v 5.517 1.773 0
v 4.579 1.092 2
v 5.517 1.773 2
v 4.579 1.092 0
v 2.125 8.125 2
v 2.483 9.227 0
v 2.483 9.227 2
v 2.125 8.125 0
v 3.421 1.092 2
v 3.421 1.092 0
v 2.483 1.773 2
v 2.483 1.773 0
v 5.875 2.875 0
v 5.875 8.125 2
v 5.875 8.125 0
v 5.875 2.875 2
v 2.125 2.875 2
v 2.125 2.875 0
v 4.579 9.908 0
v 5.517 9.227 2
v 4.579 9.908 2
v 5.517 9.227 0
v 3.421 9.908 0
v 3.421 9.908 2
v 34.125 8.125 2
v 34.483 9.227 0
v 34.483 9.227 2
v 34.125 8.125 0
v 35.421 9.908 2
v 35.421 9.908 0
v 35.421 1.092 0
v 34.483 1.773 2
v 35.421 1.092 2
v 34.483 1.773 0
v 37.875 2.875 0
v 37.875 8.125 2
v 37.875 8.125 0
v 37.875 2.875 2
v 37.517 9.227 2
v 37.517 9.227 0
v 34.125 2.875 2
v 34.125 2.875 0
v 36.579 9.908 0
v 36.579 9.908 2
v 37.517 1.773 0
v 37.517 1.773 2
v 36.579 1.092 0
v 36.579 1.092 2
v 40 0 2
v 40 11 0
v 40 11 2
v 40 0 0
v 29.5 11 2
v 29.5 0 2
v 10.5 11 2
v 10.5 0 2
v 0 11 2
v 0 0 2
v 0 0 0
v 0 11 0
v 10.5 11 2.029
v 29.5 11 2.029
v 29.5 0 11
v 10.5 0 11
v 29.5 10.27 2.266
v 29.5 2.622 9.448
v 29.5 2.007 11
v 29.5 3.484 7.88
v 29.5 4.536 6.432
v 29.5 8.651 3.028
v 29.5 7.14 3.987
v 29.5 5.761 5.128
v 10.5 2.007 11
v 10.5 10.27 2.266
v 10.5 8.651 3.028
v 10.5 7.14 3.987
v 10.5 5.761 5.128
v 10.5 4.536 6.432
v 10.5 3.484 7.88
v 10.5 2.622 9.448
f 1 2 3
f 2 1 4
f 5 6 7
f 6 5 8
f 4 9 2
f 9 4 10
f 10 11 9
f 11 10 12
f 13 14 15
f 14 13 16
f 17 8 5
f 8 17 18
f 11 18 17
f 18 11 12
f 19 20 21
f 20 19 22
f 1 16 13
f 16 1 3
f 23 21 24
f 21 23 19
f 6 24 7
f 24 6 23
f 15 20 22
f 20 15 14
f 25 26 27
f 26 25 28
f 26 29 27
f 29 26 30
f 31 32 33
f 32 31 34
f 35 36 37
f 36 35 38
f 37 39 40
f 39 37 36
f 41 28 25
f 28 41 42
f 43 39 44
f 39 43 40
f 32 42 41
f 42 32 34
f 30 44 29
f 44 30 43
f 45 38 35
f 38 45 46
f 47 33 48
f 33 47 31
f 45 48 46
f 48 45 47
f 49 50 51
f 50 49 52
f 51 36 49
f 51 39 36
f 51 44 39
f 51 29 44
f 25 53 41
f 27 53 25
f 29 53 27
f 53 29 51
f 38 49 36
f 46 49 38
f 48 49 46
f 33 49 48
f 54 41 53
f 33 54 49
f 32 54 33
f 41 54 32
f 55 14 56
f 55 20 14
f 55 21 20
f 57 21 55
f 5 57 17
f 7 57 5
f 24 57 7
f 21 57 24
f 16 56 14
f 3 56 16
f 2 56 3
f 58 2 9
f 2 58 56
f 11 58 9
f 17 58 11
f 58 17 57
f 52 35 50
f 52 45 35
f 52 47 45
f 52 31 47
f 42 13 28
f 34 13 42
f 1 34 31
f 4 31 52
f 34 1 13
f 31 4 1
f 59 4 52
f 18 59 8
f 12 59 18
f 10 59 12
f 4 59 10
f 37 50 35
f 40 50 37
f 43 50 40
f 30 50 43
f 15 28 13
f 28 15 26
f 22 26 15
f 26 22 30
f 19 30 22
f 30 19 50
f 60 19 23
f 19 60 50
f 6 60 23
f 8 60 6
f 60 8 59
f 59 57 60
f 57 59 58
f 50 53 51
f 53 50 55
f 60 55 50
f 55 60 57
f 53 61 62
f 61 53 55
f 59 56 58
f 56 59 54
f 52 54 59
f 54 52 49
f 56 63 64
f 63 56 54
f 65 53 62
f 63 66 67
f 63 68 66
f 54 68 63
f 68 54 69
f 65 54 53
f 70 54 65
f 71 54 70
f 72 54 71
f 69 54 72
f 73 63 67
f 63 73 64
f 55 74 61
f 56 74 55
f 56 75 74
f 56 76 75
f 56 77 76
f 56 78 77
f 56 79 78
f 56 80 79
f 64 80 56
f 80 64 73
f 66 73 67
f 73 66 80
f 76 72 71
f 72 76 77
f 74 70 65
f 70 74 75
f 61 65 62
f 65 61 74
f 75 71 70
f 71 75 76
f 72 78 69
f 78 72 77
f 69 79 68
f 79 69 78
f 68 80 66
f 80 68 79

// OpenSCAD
/****************************************************/
/*************User specified parameters**************/

//length of catch base
length = 40; // [5:100]

//width of catch base
width = 11; // [5:100]

//maximum height of catch
height = 11; // [5:100]

//thickness of catch base
base_thick = 2; // [0.25:5]

//width of flat portion at the top of catch
top_width = 2; // [0.25:5]

//the length (along the long axis) of the curved portion of the catch
curve_length = 19; // [5:100]

//max deviation of curve from a straight line. Place straight edge against curve, and find the max gap.
sag = 1.5; // [0.25:5]

//center to center spacing of holes
hole_spacing = 32; // [5:100]

//wide axis of hole
hole_length = 9; // [5:100]

//narrow axis of hole
hole_width = 3.75; // [0.25:5]

//fudge factor to ensure overlaps
wiggle = 0.1; // [0.001,0.01,0.1]

$fn=10;
/****************************************************/

/***************Calculated parameters****************/
curve_height = height - base_thick; // height of curved portion of catch
curve_width = width - top_width; // width of curved portion of catch
curve_chord_length = sqrt(pow(curve_height,2) + pow(curve_width,2)); // length of the chord connecting the uppermost and lowermost points on the curve
R = (pow(curve_chord_length/2,2)+pow(sag,2))/(2*sag); // Radius of the curve
ratio = curve_height/curve_width; // calculated parameter to make algebra easier
A = 1 + pow(ratio,2); // first coefficient of y quadratic equation
B = curve_height; // second coefficient of y quadratic equation
C = pow(curve_width,2)*A/4-pow(R,2)/A; // third coefficient of y quadratic equation
y = (-B + sqrt(pow(B,2) - 4*C))/2; // vertical distance from top of catch to the center of curvature
x = curve_width*(pow(ratio,2) - 1)/2 + ratio*y; // horizontal distance from top of catch to the center of curvature
echo (str("R = ",R));
echo (str("x = ",x));
echo (str("y = ",y));
echo (str("ratio = ",ratio));
echo (str("discriminant = ",pow(B,2) - 4*A*C));
/****************************************************/

union(){	
	difference(){
		cube([length,width,base_thick]);
		for (i=[-1,1]){
			translate([length/2 + i*hole_spacing/2,(width - hole_length + hole_width)/2,-wiggle]) #screwhole();
		}
	}
	
	difference(){
		translate([(length-curve_length)/2,0,base_thick]) cube([curve_length,width,curve_height]);
		#translate([(length-curve_length)/2-wiggle,width + x,height + y]) rotate([0,90,0]) cylinder(h=curve_length+2*wiggle,r=R,center=false,$fn=50);
	}
}


module screwhole()
{
	hull(){
		cylinder(h=base_thick+2*wiggle,r=hole_width/2,center=false);
		translate([0,5.25,0]) cylinder(h=base_thick+2*wiggle,r=hole_width/2,center=false);
	}
}
